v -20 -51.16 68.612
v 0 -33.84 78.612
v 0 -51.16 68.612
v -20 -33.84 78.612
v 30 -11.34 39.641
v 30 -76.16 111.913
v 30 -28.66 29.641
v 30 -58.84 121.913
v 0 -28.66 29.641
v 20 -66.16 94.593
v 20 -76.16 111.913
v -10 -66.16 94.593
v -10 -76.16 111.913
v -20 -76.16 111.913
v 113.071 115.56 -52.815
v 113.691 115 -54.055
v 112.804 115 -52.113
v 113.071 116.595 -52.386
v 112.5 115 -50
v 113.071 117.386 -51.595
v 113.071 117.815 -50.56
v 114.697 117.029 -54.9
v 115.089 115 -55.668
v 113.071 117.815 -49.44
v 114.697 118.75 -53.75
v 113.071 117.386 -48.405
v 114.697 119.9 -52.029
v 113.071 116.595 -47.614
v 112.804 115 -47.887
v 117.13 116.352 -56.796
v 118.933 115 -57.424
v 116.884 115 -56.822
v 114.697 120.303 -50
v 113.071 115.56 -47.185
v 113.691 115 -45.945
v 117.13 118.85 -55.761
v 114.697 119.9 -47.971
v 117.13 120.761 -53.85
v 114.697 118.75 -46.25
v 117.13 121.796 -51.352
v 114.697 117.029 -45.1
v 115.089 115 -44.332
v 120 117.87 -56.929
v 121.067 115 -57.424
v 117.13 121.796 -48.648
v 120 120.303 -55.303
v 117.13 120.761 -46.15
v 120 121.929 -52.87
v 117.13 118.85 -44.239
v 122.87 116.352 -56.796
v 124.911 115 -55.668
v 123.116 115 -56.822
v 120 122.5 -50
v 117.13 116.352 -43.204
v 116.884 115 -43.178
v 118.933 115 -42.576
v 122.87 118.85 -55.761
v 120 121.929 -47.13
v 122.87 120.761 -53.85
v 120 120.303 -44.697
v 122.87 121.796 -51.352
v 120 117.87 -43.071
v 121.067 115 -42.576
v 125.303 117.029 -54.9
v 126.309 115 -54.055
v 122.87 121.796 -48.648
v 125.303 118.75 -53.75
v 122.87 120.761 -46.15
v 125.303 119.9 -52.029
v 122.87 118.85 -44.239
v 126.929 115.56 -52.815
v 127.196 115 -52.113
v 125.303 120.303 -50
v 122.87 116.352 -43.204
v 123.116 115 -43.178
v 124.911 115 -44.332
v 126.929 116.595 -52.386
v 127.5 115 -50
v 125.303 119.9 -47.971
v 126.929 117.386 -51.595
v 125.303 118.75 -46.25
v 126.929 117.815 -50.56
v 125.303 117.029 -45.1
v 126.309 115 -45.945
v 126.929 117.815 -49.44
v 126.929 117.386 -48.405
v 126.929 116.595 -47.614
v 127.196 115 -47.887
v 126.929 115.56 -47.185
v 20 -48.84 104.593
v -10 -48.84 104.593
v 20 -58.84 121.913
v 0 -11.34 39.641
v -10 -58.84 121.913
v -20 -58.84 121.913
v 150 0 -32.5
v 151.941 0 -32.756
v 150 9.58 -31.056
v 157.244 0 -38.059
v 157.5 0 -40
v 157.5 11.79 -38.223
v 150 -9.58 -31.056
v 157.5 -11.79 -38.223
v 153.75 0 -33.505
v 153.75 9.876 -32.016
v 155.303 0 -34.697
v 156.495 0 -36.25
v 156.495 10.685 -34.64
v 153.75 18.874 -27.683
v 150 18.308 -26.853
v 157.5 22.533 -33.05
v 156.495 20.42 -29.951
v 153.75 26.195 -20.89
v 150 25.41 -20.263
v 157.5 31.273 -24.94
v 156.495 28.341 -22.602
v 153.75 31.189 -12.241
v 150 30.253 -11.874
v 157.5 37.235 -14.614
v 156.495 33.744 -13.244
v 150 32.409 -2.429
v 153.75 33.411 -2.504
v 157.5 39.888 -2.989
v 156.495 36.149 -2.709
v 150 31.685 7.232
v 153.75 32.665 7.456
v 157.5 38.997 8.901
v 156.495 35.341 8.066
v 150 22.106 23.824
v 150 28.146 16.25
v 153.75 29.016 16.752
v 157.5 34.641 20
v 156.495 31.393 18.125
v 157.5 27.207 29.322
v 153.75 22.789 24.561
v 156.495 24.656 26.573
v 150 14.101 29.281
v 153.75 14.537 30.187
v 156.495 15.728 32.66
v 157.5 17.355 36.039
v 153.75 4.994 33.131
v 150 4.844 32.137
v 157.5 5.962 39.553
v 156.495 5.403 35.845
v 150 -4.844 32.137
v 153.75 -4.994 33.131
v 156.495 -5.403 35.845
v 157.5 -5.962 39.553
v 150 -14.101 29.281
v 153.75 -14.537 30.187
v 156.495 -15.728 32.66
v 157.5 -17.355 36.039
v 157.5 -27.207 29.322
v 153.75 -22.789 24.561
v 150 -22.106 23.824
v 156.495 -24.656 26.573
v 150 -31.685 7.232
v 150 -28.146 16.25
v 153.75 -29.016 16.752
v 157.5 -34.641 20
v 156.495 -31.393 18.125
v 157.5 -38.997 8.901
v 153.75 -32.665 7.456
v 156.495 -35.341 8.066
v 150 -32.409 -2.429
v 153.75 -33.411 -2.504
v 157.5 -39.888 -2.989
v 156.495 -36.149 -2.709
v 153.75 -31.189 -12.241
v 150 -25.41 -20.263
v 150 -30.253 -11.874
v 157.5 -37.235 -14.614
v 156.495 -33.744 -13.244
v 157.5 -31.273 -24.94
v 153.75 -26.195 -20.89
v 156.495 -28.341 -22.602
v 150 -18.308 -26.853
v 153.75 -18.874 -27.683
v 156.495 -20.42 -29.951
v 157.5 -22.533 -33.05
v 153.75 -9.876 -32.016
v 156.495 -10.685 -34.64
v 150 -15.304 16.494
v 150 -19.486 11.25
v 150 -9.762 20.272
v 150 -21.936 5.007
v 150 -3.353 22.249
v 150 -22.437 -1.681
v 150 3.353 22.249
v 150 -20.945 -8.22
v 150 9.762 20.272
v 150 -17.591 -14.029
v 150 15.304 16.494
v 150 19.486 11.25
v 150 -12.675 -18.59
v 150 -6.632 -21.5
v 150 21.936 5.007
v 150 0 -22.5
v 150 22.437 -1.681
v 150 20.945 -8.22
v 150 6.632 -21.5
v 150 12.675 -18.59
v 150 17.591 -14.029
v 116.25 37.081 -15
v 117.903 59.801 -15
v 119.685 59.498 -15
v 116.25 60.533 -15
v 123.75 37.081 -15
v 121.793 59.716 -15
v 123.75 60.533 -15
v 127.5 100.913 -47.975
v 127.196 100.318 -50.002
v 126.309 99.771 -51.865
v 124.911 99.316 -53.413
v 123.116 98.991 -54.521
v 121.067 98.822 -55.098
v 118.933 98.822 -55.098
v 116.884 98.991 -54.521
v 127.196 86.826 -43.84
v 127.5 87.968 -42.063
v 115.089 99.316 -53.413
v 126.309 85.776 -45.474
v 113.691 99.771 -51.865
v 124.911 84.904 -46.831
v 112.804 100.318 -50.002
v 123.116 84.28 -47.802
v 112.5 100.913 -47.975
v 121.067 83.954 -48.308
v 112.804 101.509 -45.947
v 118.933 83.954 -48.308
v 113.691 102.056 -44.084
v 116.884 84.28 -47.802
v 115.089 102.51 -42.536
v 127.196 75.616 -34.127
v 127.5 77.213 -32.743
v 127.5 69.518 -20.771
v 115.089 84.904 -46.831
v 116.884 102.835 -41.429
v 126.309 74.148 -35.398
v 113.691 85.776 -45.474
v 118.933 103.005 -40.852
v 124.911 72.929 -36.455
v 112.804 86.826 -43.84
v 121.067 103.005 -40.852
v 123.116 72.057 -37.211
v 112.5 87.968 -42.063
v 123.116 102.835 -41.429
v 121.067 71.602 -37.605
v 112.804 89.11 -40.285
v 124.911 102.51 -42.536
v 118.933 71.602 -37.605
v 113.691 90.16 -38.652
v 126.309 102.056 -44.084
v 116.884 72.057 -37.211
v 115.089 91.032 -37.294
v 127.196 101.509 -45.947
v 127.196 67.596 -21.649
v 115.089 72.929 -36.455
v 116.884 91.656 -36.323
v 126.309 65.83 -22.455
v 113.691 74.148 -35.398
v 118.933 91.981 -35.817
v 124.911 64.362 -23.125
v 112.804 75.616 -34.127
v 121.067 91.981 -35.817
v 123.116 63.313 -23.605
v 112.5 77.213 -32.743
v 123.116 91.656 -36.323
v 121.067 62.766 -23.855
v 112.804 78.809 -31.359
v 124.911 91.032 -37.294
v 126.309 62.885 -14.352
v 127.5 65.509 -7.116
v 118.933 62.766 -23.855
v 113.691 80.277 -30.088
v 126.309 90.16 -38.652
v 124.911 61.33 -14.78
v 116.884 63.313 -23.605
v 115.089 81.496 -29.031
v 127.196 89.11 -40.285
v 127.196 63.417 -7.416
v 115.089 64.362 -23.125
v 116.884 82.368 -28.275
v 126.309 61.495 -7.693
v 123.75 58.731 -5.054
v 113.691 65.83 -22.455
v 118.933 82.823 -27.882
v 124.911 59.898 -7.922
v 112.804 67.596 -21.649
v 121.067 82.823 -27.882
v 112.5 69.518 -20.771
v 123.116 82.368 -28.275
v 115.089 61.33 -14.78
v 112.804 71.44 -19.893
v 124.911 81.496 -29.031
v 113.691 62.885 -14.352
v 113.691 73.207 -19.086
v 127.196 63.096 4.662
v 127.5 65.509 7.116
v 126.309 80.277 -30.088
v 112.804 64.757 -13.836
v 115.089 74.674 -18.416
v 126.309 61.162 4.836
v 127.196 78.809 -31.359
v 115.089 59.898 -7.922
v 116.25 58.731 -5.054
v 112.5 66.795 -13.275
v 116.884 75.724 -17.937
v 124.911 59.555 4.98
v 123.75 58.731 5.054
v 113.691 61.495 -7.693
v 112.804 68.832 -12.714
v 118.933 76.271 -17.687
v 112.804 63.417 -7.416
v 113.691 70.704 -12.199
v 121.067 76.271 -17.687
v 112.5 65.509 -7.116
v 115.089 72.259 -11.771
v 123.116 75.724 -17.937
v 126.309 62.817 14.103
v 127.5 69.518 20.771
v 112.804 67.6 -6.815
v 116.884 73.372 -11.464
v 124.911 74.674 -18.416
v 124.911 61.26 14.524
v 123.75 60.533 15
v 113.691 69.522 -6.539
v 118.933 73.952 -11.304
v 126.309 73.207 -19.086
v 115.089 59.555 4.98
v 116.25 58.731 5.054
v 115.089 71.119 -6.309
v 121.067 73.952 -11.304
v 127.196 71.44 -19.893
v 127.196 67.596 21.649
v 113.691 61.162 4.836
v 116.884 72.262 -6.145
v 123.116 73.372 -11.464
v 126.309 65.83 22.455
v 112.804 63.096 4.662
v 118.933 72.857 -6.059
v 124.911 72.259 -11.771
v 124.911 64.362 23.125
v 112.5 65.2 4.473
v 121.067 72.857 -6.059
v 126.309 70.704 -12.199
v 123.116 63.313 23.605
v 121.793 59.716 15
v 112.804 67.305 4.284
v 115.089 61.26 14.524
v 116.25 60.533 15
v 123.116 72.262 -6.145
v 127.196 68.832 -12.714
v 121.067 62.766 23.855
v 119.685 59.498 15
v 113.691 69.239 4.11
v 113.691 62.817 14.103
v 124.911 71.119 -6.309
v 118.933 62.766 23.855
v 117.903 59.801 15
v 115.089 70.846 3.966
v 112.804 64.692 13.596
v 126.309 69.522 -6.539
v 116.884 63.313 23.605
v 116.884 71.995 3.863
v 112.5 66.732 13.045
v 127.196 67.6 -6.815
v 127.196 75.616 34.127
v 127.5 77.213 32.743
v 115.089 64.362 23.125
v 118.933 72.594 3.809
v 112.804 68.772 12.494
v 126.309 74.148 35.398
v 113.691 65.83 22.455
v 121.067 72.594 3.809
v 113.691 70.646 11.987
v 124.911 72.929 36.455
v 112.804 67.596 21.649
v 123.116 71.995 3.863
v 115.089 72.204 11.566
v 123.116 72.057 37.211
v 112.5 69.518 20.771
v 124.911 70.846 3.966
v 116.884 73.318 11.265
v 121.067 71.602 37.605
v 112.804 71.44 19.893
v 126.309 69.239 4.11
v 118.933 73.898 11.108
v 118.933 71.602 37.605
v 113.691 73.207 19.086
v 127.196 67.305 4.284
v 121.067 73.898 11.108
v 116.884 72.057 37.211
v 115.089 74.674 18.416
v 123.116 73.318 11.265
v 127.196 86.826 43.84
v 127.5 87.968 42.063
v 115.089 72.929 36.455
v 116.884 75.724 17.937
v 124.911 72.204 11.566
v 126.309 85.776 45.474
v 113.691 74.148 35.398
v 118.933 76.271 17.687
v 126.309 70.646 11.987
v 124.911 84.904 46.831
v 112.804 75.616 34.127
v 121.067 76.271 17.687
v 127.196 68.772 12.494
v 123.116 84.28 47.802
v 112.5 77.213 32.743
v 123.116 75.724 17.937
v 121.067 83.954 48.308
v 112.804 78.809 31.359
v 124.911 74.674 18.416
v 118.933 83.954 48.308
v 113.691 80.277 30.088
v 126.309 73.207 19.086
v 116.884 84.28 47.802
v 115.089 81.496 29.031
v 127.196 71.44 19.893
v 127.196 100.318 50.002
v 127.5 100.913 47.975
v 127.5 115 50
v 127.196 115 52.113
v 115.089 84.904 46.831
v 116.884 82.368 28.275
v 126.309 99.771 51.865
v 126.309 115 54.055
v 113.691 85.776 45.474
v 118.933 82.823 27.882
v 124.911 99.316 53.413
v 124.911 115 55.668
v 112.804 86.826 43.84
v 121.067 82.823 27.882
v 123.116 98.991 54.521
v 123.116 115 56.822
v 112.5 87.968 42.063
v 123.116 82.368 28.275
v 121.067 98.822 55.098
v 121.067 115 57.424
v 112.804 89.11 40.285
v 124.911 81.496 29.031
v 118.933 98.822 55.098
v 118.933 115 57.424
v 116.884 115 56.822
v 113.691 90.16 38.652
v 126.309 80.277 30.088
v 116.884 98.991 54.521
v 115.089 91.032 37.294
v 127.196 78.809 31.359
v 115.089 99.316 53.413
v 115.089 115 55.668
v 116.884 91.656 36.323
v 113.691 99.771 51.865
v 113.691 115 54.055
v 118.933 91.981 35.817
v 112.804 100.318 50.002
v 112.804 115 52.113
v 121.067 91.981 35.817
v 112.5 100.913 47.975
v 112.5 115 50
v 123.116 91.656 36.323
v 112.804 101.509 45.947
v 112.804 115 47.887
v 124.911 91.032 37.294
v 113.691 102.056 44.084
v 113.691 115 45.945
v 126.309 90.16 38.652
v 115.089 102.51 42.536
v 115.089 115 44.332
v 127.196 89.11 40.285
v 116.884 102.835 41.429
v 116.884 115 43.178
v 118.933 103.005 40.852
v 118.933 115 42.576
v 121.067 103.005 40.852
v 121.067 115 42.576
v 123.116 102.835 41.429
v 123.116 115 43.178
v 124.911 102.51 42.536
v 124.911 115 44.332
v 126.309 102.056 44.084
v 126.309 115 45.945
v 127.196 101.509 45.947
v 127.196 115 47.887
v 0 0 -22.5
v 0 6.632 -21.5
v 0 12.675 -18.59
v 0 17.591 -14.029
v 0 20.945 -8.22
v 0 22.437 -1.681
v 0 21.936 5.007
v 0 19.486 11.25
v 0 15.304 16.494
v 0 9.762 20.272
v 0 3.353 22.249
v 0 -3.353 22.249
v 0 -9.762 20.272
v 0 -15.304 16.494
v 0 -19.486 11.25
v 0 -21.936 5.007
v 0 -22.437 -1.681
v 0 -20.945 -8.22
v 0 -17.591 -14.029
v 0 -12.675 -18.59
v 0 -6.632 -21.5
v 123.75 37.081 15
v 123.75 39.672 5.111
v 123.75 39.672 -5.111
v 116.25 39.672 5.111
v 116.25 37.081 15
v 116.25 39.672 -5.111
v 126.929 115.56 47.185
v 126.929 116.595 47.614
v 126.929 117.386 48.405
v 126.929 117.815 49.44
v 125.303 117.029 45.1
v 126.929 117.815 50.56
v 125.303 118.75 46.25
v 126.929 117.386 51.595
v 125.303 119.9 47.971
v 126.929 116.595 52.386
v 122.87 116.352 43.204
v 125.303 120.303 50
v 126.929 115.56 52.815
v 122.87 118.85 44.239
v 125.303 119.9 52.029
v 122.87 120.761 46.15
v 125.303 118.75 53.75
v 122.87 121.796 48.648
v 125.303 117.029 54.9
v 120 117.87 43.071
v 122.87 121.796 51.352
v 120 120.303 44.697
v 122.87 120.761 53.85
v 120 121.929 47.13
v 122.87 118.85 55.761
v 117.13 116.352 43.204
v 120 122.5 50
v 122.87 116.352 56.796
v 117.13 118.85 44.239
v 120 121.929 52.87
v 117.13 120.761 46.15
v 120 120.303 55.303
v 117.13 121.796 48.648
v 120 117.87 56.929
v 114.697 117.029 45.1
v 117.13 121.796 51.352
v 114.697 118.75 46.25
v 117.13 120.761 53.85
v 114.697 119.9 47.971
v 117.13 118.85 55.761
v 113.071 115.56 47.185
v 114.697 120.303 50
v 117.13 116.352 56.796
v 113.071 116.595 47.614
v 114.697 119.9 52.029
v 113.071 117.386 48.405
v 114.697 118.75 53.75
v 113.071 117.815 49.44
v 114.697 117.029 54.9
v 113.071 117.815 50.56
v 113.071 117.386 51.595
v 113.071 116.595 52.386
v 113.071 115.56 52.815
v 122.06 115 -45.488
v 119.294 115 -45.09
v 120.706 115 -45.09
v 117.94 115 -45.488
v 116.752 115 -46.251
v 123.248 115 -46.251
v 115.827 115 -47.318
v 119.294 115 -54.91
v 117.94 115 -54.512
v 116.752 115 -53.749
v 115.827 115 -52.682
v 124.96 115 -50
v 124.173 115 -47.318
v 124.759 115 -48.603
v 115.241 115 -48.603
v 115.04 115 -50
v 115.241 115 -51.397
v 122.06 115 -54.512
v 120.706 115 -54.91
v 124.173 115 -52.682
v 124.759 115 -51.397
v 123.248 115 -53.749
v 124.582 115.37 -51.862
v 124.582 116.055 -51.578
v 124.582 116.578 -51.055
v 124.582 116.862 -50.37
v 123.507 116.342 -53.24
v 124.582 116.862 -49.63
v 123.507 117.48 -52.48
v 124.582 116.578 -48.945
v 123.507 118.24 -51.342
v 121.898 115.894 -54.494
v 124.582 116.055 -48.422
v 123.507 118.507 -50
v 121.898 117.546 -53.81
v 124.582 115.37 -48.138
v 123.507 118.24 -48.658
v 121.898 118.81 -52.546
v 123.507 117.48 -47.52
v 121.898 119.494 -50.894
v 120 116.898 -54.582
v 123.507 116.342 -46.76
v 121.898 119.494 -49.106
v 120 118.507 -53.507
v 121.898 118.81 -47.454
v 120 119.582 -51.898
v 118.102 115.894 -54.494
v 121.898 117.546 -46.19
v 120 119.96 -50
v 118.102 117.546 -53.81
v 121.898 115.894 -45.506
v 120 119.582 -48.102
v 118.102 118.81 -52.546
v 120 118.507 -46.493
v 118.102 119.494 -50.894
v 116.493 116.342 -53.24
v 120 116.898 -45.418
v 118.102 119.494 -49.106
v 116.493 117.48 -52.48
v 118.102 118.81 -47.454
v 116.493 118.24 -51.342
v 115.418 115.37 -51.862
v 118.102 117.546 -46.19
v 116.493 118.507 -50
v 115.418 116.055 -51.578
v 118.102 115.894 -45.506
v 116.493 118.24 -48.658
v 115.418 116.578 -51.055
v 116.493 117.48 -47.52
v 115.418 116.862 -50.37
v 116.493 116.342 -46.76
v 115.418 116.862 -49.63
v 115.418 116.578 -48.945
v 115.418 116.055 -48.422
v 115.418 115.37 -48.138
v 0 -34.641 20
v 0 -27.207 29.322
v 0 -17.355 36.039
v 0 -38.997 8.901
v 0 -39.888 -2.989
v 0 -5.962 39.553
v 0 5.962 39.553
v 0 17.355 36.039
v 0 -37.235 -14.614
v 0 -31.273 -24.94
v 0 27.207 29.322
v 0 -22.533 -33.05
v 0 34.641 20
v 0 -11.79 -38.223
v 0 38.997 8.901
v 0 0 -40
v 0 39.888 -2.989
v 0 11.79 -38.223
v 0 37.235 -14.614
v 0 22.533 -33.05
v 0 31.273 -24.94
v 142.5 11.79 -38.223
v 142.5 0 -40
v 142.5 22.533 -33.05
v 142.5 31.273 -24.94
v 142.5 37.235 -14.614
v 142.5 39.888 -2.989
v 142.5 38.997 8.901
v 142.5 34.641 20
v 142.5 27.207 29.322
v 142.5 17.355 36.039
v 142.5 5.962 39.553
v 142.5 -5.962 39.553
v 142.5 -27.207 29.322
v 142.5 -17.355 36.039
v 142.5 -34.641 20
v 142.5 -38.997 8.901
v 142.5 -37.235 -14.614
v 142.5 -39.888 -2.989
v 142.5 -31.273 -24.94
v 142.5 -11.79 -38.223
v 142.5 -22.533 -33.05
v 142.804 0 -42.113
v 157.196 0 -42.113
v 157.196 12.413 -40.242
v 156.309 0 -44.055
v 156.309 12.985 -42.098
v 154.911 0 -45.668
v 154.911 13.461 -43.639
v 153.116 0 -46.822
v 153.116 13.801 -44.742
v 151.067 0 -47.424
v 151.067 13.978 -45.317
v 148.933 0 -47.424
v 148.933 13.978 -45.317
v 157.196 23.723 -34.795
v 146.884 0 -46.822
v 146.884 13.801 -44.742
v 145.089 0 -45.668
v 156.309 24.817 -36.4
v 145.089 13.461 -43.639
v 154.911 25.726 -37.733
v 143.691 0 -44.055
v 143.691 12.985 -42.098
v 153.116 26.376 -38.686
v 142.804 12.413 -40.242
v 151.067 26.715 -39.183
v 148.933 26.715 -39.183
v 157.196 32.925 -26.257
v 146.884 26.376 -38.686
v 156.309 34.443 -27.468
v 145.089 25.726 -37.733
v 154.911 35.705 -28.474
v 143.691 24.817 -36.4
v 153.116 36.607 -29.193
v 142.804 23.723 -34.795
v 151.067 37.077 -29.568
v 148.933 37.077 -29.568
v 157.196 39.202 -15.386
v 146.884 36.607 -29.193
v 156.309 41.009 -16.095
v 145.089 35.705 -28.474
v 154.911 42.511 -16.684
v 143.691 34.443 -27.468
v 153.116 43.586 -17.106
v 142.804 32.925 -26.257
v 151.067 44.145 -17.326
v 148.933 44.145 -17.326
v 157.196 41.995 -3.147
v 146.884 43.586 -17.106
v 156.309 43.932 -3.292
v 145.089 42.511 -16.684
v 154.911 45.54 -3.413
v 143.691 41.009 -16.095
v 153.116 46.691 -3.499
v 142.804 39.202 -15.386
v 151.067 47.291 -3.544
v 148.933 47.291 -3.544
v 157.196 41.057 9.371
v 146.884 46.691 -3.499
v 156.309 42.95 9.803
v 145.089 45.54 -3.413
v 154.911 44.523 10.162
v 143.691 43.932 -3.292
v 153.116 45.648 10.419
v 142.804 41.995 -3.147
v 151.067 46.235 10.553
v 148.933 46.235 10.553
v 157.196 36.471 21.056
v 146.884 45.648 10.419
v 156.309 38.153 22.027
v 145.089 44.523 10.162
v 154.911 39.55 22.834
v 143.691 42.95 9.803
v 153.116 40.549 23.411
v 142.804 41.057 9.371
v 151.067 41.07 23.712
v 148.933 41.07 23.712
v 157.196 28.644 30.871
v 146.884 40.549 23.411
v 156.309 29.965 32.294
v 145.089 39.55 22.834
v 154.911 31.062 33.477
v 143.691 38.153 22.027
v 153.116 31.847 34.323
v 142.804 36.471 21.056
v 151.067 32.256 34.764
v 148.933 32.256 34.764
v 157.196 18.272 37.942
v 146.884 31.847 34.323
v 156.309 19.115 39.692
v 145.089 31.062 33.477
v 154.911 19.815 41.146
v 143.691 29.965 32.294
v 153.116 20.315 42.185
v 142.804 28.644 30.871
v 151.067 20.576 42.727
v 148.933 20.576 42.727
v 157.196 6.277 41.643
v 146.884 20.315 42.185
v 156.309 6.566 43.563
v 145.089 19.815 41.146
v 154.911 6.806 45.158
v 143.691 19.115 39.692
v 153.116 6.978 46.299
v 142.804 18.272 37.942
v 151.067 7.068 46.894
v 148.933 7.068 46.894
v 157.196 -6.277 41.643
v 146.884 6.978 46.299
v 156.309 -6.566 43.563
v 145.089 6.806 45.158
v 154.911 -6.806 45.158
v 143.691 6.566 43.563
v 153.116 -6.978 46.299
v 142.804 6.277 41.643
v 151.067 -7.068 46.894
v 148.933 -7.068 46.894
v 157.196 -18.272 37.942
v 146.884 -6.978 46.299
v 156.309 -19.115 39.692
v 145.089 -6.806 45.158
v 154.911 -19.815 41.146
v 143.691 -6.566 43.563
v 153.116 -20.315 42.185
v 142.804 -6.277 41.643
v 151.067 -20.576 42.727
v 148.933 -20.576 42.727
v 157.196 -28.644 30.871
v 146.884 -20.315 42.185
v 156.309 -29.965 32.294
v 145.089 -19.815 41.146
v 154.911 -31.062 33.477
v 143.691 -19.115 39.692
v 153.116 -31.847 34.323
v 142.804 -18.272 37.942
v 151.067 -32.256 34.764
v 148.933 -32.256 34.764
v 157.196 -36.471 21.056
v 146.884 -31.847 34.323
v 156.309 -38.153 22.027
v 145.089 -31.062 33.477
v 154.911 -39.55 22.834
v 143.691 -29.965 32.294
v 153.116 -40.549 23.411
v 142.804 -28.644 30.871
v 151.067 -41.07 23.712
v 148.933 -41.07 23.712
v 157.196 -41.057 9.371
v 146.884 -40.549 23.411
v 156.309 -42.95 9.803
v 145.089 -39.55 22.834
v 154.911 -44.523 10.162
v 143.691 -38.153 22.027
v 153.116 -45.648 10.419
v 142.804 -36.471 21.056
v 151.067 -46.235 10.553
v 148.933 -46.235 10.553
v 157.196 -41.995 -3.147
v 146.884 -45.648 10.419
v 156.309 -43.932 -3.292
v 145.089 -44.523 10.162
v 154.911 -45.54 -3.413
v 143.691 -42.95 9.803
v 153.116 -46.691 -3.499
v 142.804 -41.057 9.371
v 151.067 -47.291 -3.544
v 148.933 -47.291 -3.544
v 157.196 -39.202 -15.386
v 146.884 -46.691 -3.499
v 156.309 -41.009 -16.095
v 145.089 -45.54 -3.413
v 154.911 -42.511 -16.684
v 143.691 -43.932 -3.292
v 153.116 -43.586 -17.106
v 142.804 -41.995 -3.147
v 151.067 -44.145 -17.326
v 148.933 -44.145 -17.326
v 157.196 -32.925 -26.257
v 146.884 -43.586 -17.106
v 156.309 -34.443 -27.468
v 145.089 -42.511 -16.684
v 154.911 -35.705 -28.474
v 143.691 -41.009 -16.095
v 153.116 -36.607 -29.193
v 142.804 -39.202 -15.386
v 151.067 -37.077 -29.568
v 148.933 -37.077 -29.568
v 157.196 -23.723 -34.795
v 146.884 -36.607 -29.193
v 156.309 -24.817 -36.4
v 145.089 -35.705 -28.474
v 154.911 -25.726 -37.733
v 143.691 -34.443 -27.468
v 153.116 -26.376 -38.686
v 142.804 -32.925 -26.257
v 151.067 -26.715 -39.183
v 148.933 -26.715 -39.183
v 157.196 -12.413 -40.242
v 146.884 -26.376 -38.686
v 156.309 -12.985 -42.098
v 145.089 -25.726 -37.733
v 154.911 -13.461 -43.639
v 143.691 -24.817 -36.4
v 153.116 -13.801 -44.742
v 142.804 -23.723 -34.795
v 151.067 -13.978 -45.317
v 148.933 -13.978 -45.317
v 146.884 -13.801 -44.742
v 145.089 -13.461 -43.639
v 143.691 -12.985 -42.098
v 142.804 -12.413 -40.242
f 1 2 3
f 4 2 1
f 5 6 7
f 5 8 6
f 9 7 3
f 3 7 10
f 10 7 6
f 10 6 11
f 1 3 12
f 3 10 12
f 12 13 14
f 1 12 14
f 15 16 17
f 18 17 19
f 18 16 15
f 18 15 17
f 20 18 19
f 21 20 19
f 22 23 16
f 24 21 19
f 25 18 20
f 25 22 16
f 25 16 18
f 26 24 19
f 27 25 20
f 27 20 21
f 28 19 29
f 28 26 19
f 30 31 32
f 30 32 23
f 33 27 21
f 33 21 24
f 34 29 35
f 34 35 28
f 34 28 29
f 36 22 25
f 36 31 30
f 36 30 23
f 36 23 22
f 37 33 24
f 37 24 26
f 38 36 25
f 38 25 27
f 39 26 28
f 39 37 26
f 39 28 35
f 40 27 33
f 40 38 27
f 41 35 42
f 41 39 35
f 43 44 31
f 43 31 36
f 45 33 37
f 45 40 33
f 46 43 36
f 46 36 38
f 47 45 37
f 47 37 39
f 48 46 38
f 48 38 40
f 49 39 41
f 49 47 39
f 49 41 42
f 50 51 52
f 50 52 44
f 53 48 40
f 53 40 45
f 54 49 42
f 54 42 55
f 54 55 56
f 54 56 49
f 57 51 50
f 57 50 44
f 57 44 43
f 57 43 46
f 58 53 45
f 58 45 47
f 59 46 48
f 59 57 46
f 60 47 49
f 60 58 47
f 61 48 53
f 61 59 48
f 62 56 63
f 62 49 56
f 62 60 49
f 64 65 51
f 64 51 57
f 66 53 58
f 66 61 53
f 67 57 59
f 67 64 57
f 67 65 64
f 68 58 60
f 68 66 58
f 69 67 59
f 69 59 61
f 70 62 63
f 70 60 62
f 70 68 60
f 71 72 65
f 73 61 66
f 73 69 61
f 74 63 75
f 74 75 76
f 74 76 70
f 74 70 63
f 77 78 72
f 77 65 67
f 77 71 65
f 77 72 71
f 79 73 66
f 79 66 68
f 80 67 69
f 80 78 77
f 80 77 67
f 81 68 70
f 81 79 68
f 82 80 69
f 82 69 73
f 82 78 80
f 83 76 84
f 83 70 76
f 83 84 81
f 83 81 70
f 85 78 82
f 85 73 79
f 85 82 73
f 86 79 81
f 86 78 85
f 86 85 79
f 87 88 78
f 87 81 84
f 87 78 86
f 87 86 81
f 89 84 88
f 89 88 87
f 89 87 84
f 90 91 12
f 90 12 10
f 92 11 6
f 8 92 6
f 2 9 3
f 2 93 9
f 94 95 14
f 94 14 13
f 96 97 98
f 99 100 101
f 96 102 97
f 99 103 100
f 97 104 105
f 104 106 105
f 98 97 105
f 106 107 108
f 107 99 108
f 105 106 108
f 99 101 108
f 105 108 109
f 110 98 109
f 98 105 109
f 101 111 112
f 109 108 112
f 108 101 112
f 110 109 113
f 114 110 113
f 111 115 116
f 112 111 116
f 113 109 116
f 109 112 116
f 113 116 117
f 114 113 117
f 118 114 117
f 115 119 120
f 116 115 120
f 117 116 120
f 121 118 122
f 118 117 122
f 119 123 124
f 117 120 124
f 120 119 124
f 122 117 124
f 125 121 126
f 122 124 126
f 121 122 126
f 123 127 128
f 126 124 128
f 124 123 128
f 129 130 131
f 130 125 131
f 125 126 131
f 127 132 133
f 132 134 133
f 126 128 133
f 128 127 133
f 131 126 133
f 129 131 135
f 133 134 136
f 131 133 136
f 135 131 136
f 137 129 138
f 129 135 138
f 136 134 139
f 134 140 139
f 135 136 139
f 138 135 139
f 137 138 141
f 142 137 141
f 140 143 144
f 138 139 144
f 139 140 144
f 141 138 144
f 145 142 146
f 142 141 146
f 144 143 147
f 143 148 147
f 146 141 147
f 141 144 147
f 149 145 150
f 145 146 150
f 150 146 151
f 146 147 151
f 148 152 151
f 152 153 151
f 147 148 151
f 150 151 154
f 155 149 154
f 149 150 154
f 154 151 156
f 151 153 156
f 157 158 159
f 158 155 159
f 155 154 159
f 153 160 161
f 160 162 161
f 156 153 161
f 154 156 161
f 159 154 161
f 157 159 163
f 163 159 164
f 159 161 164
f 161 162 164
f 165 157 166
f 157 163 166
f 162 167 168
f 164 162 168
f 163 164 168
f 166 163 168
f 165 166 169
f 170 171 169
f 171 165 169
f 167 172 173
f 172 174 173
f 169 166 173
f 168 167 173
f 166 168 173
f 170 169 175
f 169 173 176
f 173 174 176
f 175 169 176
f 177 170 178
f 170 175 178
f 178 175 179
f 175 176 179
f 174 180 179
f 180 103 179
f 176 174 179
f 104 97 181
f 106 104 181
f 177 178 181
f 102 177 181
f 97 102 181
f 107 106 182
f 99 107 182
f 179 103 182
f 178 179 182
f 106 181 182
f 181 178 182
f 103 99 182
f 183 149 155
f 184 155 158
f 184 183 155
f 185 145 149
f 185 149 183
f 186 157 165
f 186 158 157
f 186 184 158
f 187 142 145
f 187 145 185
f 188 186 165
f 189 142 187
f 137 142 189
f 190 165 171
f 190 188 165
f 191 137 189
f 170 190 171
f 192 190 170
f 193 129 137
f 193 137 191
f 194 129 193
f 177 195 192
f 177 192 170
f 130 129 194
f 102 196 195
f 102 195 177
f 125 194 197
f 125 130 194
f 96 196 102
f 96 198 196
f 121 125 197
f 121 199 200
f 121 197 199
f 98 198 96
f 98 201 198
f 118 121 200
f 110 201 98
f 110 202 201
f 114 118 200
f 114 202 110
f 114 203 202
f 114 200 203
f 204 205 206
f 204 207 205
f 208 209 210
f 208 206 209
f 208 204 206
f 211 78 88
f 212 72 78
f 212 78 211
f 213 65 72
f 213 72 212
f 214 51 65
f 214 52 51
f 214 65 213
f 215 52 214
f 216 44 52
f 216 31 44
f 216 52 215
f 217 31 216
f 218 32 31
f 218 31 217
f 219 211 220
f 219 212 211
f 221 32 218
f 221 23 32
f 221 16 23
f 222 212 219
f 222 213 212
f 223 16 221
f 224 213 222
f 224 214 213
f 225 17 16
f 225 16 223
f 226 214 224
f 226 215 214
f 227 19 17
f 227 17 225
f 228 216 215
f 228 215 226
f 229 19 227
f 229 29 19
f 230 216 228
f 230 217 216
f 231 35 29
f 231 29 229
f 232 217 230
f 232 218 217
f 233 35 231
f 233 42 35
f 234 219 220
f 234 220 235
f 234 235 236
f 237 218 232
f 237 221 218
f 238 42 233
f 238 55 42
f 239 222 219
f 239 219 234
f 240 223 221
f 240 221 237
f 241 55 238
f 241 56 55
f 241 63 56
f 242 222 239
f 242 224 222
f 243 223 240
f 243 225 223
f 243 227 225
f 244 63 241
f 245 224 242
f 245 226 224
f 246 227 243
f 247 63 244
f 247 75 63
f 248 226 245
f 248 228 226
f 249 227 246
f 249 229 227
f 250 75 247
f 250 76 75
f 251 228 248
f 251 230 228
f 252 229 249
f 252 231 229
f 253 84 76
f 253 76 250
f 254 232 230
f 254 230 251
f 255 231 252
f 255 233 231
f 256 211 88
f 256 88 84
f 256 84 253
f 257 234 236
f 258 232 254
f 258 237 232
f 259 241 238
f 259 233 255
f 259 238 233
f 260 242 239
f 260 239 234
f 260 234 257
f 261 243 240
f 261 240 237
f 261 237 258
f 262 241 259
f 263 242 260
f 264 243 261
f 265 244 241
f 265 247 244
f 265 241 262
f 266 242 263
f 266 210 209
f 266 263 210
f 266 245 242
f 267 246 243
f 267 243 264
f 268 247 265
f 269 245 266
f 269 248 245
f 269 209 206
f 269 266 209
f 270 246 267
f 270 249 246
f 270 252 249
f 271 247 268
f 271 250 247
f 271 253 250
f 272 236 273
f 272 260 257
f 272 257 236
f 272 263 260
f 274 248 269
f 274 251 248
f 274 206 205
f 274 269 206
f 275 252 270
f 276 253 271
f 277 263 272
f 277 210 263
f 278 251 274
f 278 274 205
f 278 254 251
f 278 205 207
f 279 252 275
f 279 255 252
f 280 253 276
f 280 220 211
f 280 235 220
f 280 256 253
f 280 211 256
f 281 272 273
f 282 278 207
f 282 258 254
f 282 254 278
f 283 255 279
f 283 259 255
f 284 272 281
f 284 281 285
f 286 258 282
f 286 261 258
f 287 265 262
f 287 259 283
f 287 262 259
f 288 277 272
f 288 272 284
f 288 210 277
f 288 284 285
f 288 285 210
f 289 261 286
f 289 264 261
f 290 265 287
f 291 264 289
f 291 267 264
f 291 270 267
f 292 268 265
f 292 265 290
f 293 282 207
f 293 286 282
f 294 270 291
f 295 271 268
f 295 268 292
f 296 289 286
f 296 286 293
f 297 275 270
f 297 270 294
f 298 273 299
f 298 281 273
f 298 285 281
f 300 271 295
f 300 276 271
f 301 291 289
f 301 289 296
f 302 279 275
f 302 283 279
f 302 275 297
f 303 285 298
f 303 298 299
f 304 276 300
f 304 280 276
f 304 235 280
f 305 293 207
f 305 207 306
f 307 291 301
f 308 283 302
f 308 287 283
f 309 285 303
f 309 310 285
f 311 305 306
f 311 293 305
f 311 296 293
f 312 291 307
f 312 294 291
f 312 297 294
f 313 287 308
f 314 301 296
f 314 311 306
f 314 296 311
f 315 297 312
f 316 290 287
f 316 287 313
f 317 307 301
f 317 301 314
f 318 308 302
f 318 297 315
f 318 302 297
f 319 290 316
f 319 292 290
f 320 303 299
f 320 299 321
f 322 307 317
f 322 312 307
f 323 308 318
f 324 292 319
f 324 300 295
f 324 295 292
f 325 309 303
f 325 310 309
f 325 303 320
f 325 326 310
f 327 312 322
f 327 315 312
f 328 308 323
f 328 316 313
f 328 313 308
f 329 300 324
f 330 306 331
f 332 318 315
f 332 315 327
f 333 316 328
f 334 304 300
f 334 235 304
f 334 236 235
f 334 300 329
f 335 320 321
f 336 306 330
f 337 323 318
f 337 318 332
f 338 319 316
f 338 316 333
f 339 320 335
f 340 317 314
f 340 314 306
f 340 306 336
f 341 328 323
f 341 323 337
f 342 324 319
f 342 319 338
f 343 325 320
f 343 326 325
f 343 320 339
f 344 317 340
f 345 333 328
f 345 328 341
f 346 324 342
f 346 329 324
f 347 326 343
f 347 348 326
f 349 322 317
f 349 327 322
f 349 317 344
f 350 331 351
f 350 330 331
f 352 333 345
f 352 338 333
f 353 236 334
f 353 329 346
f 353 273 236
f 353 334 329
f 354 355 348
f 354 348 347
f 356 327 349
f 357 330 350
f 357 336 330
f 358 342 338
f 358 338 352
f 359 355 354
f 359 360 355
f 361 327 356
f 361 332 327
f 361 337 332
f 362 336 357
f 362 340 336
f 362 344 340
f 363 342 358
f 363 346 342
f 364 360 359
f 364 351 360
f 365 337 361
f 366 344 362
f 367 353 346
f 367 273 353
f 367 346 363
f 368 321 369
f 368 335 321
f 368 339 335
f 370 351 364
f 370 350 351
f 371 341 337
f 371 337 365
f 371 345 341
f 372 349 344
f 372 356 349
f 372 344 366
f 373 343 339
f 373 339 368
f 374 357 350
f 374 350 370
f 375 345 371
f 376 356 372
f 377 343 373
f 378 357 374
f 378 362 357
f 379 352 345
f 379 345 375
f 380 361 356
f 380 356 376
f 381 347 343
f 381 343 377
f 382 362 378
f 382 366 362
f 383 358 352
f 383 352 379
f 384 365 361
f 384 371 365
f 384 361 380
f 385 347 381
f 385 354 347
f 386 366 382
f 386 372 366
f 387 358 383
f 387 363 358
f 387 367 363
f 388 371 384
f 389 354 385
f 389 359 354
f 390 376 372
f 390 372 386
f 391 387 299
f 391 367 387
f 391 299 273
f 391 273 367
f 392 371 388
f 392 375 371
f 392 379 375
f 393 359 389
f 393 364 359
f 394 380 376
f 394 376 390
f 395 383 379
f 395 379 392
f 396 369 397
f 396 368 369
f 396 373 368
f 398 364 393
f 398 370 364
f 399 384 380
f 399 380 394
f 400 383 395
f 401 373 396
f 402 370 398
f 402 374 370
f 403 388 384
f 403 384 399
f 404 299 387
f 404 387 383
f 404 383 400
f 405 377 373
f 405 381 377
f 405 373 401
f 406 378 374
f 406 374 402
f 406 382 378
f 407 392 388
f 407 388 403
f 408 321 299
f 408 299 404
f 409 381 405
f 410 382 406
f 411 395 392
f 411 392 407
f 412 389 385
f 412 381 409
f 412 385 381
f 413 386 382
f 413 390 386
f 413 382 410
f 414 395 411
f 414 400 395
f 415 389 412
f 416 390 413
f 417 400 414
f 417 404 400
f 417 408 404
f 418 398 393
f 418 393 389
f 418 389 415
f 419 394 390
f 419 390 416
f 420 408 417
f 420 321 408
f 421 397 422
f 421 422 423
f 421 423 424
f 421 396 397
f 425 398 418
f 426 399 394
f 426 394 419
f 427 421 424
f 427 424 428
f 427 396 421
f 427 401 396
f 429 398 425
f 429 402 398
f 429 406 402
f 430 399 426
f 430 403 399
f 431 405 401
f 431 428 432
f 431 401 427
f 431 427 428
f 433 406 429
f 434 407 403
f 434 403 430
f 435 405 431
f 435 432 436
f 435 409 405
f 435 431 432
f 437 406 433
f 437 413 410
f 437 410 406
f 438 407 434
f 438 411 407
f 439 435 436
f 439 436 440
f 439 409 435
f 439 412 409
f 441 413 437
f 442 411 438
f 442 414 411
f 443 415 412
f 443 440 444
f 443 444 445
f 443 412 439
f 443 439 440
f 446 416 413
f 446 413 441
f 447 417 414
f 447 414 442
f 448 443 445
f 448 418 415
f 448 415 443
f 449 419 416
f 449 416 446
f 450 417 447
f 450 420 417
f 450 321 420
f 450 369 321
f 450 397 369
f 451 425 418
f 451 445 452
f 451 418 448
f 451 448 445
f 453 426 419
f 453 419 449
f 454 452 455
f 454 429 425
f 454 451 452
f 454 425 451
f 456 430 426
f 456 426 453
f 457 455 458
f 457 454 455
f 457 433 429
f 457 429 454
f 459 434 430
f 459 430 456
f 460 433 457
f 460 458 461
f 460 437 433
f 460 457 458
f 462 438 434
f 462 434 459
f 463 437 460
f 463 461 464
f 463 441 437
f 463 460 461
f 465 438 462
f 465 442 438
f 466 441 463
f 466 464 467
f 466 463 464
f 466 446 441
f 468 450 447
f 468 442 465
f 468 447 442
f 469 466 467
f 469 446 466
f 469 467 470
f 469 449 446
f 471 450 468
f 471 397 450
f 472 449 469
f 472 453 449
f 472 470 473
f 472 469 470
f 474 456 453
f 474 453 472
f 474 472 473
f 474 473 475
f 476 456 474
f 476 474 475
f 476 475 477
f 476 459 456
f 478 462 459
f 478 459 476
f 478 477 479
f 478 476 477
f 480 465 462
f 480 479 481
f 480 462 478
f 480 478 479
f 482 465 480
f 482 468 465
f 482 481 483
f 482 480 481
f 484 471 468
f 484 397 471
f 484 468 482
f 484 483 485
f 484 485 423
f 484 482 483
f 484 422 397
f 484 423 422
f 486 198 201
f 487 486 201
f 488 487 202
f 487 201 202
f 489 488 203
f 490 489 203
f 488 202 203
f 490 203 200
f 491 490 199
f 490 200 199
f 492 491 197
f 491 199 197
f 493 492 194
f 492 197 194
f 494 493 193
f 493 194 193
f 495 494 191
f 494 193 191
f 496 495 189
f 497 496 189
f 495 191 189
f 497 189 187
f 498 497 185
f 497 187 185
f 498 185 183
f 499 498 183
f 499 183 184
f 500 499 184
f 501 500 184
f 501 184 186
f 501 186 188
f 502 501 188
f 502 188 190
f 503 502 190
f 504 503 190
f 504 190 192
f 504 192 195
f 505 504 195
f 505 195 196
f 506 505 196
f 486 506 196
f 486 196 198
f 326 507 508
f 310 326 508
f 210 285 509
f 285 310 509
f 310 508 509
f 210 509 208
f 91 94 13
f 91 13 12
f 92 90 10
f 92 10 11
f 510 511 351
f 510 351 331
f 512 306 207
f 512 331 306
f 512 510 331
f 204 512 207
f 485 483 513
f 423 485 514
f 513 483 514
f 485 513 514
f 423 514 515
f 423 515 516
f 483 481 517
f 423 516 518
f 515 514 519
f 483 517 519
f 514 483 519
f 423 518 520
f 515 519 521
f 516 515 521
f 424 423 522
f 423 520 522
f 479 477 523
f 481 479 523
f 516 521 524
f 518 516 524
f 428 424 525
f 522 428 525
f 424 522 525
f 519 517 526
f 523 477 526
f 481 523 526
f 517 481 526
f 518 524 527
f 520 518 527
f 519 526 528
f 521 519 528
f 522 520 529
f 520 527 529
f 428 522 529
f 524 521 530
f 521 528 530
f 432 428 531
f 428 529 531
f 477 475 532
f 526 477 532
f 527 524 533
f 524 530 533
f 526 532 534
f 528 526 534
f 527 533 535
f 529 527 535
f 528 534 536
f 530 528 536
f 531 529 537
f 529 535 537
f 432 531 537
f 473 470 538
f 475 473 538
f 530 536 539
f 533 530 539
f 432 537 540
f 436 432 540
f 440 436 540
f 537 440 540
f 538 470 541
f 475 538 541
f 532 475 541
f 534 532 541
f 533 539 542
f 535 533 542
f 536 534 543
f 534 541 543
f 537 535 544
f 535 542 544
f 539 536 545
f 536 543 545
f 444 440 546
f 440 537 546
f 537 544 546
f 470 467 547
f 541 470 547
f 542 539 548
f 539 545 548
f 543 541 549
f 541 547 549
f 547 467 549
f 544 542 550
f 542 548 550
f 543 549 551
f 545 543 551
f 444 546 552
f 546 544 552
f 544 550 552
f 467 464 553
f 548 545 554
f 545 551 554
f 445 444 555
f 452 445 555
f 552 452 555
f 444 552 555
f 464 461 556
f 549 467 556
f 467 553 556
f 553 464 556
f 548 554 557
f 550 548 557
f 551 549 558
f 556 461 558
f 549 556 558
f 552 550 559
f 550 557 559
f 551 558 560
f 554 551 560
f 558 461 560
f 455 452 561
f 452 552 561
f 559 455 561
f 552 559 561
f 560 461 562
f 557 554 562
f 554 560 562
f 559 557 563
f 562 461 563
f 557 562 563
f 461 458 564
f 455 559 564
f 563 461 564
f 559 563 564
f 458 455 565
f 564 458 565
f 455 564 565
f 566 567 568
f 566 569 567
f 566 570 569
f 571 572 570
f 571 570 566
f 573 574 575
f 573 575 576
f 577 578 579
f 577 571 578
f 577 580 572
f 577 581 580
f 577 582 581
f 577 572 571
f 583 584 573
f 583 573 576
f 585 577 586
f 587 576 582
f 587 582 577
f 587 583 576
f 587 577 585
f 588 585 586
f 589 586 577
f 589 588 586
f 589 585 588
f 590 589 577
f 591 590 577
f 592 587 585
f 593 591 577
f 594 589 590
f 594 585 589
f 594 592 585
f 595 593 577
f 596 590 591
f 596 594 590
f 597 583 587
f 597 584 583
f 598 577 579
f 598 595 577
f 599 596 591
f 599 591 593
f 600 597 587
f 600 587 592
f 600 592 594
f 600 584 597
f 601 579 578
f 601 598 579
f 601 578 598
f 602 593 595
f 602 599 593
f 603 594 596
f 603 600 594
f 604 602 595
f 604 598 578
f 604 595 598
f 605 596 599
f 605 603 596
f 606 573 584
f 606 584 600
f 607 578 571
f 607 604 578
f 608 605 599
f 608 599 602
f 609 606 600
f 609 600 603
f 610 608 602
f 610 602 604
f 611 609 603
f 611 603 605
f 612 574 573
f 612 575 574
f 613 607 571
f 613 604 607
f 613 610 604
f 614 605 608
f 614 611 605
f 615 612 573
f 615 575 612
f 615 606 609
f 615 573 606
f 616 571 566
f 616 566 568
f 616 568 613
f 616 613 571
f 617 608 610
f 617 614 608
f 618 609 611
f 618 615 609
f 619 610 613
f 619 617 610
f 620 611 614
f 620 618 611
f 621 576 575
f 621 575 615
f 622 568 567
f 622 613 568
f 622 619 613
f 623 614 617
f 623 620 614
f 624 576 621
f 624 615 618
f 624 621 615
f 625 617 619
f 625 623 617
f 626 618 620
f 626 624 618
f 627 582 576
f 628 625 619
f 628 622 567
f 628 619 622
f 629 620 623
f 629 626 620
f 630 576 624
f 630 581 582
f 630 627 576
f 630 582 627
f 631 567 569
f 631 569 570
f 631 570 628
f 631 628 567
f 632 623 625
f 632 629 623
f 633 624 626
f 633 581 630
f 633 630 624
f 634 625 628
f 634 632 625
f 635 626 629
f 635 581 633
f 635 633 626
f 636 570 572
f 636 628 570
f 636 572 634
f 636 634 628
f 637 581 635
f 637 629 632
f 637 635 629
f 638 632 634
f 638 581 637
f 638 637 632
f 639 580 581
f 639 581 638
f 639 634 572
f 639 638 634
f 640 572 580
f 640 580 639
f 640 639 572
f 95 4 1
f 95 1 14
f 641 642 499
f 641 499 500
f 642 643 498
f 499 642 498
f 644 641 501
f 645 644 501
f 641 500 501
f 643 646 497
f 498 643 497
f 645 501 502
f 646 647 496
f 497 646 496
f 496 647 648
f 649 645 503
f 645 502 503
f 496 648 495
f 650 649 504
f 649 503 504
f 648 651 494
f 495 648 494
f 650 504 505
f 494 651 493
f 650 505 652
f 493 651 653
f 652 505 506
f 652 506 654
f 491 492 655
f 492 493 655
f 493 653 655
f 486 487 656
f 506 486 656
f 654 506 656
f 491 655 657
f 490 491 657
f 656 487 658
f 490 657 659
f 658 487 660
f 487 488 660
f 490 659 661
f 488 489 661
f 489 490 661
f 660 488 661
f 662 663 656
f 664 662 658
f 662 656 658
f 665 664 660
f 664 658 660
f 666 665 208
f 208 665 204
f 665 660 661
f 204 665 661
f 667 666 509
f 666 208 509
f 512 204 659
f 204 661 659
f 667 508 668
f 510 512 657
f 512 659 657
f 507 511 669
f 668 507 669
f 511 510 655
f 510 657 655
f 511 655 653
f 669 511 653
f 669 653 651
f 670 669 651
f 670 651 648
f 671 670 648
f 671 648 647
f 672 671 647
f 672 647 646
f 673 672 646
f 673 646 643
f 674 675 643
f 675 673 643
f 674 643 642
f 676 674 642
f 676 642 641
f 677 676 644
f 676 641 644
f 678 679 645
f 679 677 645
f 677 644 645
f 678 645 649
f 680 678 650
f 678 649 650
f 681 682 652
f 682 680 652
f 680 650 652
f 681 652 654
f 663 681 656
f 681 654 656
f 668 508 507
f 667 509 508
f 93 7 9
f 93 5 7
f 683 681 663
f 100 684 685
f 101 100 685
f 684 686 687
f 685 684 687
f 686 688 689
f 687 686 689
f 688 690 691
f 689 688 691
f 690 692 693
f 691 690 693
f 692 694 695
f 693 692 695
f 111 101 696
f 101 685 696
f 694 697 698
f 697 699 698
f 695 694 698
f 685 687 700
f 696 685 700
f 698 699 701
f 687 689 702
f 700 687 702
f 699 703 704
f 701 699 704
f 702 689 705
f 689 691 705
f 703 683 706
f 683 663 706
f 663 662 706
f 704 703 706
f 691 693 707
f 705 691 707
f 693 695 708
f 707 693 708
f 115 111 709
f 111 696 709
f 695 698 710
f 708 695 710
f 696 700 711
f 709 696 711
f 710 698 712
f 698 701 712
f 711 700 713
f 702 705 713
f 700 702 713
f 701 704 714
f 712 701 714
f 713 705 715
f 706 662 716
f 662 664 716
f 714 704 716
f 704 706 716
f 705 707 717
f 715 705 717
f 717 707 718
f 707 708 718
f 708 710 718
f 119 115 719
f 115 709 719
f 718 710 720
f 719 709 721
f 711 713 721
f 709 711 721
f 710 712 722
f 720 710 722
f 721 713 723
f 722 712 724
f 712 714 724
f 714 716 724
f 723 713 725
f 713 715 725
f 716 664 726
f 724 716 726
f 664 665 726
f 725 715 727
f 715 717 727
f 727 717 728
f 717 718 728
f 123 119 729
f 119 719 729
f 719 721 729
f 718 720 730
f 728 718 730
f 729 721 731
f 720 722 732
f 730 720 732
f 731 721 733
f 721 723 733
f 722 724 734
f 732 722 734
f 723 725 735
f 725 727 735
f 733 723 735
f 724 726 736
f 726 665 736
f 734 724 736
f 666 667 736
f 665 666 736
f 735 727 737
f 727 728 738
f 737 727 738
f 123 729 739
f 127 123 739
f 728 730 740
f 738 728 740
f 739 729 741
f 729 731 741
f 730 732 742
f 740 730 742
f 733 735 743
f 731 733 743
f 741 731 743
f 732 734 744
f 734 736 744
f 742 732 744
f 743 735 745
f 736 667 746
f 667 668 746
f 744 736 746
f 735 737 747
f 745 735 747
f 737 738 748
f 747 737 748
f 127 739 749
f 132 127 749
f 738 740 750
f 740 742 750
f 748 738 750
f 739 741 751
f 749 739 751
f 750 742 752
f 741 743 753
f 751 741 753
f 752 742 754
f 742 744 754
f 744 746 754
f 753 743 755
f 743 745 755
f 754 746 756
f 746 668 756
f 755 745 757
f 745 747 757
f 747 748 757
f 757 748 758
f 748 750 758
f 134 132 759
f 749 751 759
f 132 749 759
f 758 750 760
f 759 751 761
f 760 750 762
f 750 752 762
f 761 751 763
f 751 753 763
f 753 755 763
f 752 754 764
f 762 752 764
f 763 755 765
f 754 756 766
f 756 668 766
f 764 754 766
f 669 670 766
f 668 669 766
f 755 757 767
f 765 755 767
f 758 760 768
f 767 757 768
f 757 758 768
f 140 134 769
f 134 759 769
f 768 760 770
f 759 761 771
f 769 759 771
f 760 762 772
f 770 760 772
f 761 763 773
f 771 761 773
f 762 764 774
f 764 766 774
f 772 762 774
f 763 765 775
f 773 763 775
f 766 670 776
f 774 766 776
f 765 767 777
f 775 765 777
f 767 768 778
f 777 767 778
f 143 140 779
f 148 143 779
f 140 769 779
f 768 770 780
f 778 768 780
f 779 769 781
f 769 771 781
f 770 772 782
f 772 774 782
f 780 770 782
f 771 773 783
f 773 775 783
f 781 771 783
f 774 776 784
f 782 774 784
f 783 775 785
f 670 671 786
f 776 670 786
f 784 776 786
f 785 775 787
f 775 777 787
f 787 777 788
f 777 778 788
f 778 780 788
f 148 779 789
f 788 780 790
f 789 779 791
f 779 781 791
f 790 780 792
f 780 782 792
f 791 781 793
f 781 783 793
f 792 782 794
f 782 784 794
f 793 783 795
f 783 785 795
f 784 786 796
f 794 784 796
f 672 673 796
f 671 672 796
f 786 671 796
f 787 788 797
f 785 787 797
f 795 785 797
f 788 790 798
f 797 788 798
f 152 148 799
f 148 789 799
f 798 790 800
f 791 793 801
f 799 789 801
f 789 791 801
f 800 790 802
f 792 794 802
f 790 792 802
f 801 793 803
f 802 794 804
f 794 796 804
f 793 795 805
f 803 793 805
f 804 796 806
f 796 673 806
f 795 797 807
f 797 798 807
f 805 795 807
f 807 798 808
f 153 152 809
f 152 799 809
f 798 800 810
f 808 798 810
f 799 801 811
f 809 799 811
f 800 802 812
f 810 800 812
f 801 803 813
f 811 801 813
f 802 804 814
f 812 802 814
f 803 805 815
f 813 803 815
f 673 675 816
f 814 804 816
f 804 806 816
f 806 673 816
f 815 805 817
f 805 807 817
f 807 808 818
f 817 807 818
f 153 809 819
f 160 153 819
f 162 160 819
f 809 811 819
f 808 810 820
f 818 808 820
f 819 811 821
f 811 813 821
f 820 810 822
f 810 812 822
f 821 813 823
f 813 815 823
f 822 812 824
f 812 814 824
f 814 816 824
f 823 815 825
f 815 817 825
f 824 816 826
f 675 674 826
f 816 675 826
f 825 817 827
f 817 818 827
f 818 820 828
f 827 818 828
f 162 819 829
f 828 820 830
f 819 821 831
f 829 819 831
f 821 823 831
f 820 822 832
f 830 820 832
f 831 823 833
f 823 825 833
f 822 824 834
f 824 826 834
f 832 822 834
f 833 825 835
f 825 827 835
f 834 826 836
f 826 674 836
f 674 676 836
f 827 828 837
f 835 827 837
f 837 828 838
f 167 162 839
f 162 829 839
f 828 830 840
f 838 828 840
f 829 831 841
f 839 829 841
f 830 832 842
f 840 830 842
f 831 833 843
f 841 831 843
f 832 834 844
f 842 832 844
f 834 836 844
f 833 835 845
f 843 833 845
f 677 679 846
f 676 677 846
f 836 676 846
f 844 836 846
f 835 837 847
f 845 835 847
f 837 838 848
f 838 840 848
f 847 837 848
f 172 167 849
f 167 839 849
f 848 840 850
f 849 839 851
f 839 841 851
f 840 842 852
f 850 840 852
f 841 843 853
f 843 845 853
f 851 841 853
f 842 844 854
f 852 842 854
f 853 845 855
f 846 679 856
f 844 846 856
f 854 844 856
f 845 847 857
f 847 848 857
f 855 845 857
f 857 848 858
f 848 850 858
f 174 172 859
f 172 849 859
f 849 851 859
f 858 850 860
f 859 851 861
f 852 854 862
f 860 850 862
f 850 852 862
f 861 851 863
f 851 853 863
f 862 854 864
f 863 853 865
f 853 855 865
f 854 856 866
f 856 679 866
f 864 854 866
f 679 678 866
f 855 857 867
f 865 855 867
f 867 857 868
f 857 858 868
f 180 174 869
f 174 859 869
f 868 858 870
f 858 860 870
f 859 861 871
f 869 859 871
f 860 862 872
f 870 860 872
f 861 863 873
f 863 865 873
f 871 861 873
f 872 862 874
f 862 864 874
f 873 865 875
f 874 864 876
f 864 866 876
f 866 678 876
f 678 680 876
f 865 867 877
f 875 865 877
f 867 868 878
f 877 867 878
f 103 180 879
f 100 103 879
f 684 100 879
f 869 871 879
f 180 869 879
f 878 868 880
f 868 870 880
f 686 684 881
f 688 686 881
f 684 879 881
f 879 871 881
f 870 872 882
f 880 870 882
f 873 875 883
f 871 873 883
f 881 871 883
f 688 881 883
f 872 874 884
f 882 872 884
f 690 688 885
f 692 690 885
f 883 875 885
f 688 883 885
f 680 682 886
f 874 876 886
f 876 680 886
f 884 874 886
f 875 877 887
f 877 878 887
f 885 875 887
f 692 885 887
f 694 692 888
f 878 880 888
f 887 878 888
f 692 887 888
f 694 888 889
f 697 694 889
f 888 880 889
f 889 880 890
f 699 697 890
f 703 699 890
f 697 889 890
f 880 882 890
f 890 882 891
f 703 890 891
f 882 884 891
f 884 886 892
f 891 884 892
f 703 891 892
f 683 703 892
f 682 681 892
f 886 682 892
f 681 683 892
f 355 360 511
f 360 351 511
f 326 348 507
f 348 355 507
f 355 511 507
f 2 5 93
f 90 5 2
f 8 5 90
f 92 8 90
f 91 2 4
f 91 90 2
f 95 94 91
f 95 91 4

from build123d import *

# Parameters (mm, degrees)
SKETCH2_R           = 40
BOSS_EXTRUDE1_DEPTH = 150
CUT_EXTRUDE1_REACH  = 152
SKETCH3_R           = 22.5
SKETCH4_R           = 7.5
SKETCH10_R          = 7.5
REVOLVE4_ANGLE      = 180
REVOLVE_THIN1_ANGLE = 180
REVOLVE5_ANGLE      = 180
BOSS_EXTRUDE2_START = 37.080992
SKETCH14_W          = 7.5
SKETCH14_H          = 30
BOSS_EXTRUDE2_DEPTH = 23.451527
BOSS_EXTRUDE3_DEPTH = 10


with BuildPart() as part:
    # Sketch2 → Boss-Extrude1 (new body)
    with BuildSketch(Plane(origin=(0, 0, 0), x_dir=(0, 0, -1), z_dir=(1, 0, 0))):
        Circle(SKETCH2_R)
    extrude(amount=BOSS_EXTRUDE1_DEPTH)

    # Sketch3 → Cut-Extrude1 (cut, up to next)
    with BuildSketch(Plane(origin=(150, 0, 0), x_dir=(0, 0, -1), z_dir=(1, 0, 0)), mode=Mode.PRIVATE) as cut_extrude1_sk1:
        Circle(SKETCH3_R)
    cut_extrude1_tool1 = extrude(cut_extrude1_sk1.sketch, amount=-CUT_EXTRUDE1_REACH, mode=Mode.PRIVATE) & part.part
    add(cut_extrude1_tool1.solids().sort_by_distance((150, 0, 0))[0], mode=Mode.SUBTRACT)

    # Sketch4 → Revolve1 (revolve)
    with BuildSketch(Plane(origin=(0, 0, 0), x_dir=(1, 0, 0), z_dir=(0, 1, 0))):
        with Locations((150, 40)):
            Circle(SKETCH4_R)
    revolve(axis=Axis((-12.406520542, 0, 0), (1, 0, 0)))



with BuildPart() as body_2:
    # Sketch10 → Revolve4 (revolve)
    with BuildSketch(Plane(origin=(0, 115, 0), x_dir=(1, 0, 0), z_dir=(0, 1, 0))):
        with Locations((120, 50)):
            Circle(SKETCH10_R)
    revolve(axis=Axis((-32.41140005, 115, 0), (-1, 0, 0)), revolution_arc=REVOLVE4_ANGLE)

    # Sketch12 → Revolve-Thin1 (revolve)
    with BuildSketch(Plane(origin=(0, 115, 0), x_dir=(1, 0, 0), z_dir=(0, 1, 0))):
        with BuildLine():
            ThreePointArc((112.5, 50), (120, 57.5), (127.5, 50))
            Line((127.5, 50), (124.96, 50))
            ThreePointArc((124.96, 50), (120, 54.96), (115.04, 50))
            Line((115.04, 50), (112.5, 50))
        make_face()
    revolve(axis=Axis((112.5, 115, -50), (1, 0, 0)), revolution_arc=REVOLVE_THIN1_ANGLE)

    # Sketch13 → Revolve5 (revolve)
    with BuildSketch(Plane(origin=(0, 115, 0), x_dir=(1, 0, 0), z_dir=(0, 1, 0))):
        with BuildLine():
            Line((112.5, -50), (127.5, -50))
            ThreePointArc((127.5, -50), (120, -42.5), (112.5, -50))
        make_face()
    revolve(axis=Axis((112.5, 115, 50), (1, 0, 0)), revolution_arc=REVOLVE5_ANGLE)


with BuildPart() as part_1:
    add(part.part)

    add(body_2.part)  # Boss-Extrude2 merges body 2
    # Sketch14 → Boss-Extrude2 (add)
    with BuildSketch(Plane(origin=(0, 0, 0), x_dir=(1, 0, 0), z_dir=(0, 1, 0)).offset(BOSS_EXTRUDE2_START)):
        with Locations((120, 0)):
            Rectangle(SKETCH14_W, SKETCH14_H)
    extrude(amount=BOSS_EXTRUDE2_DEPTH)


with BuildPart() as body_2_2:
    # Sketch15 → Boss-Extrude3 (new body, symmetric)
    with BuildSketch(Plane(origin=(0, 0, 0), x_dir=(-1, 0, 0), z_dir=(0, 0.866025404, 0.5))):
        Polygon((0, 40), (0, 85), (20, 85), (20, 135), (10, 135), (10, 115), (-20, 115), (-20, 135), (-30, 135), (-30, 40), align=None)
    extrude(amount=BOSS_EXTRUDE3_DEPTH, both=True)


solid = Compound([part_1.part, body_2_2.part])
